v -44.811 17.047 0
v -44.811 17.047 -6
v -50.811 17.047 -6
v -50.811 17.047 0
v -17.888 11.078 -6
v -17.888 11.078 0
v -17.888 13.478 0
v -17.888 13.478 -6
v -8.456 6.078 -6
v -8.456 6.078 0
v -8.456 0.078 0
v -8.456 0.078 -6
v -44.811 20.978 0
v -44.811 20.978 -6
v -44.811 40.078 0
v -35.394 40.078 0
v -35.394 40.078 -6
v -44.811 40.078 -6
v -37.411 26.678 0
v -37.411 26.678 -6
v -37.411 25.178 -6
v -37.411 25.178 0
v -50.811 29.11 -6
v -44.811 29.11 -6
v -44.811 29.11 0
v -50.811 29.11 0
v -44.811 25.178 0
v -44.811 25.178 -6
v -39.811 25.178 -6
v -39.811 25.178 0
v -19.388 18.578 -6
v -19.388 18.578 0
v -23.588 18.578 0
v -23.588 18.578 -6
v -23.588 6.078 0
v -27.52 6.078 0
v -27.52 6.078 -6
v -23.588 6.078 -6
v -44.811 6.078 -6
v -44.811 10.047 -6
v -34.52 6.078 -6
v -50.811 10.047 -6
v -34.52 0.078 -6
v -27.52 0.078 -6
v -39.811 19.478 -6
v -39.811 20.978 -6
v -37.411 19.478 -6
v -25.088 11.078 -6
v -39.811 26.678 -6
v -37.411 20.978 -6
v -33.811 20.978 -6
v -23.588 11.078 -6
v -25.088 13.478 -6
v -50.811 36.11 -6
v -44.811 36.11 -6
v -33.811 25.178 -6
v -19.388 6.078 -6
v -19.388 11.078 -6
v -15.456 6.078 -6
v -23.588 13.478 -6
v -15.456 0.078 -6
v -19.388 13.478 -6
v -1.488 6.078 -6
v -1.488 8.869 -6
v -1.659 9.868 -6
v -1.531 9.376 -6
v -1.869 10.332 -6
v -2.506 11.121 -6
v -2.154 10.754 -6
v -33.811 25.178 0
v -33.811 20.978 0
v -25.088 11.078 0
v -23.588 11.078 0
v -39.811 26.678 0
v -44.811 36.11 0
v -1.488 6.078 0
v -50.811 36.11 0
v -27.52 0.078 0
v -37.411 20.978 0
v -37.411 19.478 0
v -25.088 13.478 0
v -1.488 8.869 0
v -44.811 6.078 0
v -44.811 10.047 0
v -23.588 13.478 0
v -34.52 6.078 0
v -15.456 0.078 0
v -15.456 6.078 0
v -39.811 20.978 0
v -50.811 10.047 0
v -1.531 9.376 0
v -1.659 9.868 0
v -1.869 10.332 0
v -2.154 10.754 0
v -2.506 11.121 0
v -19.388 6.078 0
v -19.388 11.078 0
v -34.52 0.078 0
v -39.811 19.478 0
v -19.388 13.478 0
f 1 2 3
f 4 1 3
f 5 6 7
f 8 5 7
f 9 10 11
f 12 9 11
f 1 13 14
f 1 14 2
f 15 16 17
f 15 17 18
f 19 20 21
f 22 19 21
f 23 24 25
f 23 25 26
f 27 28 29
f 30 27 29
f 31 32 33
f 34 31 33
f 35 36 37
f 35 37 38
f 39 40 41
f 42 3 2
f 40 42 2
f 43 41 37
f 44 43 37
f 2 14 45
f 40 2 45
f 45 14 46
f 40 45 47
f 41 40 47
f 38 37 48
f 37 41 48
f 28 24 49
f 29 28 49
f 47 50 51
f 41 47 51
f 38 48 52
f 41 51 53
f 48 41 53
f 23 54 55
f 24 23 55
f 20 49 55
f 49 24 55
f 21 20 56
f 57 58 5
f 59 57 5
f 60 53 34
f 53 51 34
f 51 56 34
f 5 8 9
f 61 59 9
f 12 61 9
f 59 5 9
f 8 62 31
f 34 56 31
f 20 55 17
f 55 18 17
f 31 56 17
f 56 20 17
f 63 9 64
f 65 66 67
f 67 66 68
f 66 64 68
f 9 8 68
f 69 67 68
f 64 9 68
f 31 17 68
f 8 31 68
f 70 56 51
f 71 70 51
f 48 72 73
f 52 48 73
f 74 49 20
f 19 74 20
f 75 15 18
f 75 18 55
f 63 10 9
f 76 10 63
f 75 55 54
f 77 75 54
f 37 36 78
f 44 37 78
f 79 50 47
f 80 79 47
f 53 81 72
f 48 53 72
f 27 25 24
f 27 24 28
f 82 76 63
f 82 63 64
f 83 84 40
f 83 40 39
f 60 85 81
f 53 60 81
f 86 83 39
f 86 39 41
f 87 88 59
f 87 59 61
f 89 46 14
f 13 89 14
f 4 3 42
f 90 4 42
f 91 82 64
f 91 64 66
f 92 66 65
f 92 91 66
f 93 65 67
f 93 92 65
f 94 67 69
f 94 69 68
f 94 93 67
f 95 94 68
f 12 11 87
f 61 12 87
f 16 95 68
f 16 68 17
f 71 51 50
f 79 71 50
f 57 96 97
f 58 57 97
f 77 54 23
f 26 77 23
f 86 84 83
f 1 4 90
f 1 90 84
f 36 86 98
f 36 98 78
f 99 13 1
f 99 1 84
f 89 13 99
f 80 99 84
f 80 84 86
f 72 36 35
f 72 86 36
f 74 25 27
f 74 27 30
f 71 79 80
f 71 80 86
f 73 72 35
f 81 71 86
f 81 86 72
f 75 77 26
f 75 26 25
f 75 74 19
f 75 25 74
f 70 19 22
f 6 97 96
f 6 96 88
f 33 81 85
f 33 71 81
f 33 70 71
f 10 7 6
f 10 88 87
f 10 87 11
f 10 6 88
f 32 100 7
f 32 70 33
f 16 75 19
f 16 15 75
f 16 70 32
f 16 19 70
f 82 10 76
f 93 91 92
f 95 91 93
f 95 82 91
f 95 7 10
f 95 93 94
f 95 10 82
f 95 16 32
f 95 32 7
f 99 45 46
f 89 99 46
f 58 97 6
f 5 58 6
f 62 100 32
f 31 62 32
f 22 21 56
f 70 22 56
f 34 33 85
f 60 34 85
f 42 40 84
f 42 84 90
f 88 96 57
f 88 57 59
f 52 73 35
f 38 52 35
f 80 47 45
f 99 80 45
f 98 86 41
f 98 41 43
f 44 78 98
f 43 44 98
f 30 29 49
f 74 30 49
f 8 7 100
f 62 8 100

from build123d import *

# Parameters (mm, degrees)
EXTRUDE_1_DEPTH      = 6
SKETCH_2_W           = 7
SKETCH_2_H           = 6
EXTRUDE_2_DEPTH      = 6
CUT_EXTRUDE_1_DEPTH  = 7
SKETCH_21_W          = 7
SKETCH_21_H          = 6
EXTRUDE_21_DEPTH     = 6
SKETCH_22_W          = 7
SKETCH_22_H          = 6
EXTRUDE_22_DEPTH     = 6
CUT_EXTRUDE_12_DEPTH = 7
SKETCH_23_W          = 7
SKETCH_23_H          = 6
EXTRUDE_24_DEPTH     = 6


with BuildPart() as part:
    # Эскиз1 → Бобышка-Вытянуть1 (new body)
    with BuildSketch(Plane.XY):
        with BuildLine():
            Line((-44.810940225, 6.078379342), (-3.810940225, 6.078379342))
            Line((-3.810940225, 6.078379342), (-1.488167872, 6.078379342))
            Line((-1.488167872, 6.078379342), (-1.488167872, 8.8692773))
            ThreePointArc((-1.488167872, 8.8692773), (-1.754354552, 10.10469817), (-2.50567769, 11.120883988))
            Line((-2.50567769, 11.120883988), (-35.394057565, 40.078379342))
            Line((-35.394057565, 40.078379342), (-44.810940225, 40.078379342))
            Line((-44.810940225, 40.078379342), (-44.810940225, 6.078379342))
        make_face()
    extrude(amount=-EXTRUDE_1_DEPTH)

    # Эскиз2 → Бобышка-Вытянуть2 (add)
    with BuildSketch(Plane(origin=(5.189059775, 23.078379342, -6), x_dir=(0, -1, 0), z_dir=(0, 0, -1))):
        with Locations((-9.531849908, 53)):
            Rectangle(SKETCH_2_W, SKETCH_2_H)
        with Locations((9.531849908, 53)):
            Rectangle(SKETCH_2_W, SKETCH_2_H)
    extrude(amount=-EXTRUDE_2_DEPTH)

    # Эскиз3 → Вырез-Вытянуть1 (cut, through all)
    with BuildSketch(Plane(origin=(5.189059775, 23.078379342, -6), x_dir=(0, -1, 0), z_dir=(0, 0, -1))):
        Polygon((-2.1, 45), (-3.6, 45), (-3.6, 42.6), (-2.1, 42.6), (-2.1, 39), (2.1, 39), (2.1, 42.6), (3.6, 42.6), (3.6, 45), (2.1, 45), (2.1, 50), (-2.1, 50), align=None)
    extrude(amount=-CUT_EXTRUDE_1_DEPTH, mode=Mode.SUBTRACT)

    # Эскиз21 → Бобышка-Вытянуть21 (add)
    with BuildSketch(Plane(origin=(5.189059775, 23.078379342, 0), x_dir=(0, 1, 0), z_dir=(0, 0, 1))):
        with Locations((-9.531849908, 53)):
            Rectangle(SKETCH_21_W, SKETCH_21_H)
        with Locations((9.531849908, 53)):
            Rectangle(SKETCH_21_W, SKETCH_21_H)
    extrude(amount=-EXTRUDE_21_DEPTH)

    # Эскиз22 → Бобышка-Вытянуть22 (add)
    with BuildSketch(Plane(origin=(-21.488167872, 56.078379342, 0), x_dir=(-1, 0, 0), z_dir=(0, 0, 1))):
        with Locations((-9.531849908, 53)):
            Rectangle(SKETCH_22_W, SKETCH_22_H)
        with Locations((9.531849908, 53)):
            Rectangle(SKETCH_22_W, SKETCH_22_H)
    extrude(amount=-EXTRUDE_22_DEPTH)

    # Эскиз32 → Вырез-Вытянуть12 (cut, through all)
    with BuildSketch(Plane(origin=(-21.488167872, 56.078379342, 0), x_dir=(-1, 0, 0), z_dir=(0, 0, 1))):
        Polygon((-2.1, 45), (-3.6, 45), (-3.6, 42.6), (-2.1, 42.6), (-2.1, 37.5), (2.1, 37.5), (2.1, 42.6), (3.6, 42.6), (3.6, 45), (2.1, 45), (2.1, 50), (-2.1, 50), align=None)
    extrude(amount=-CUT_EXTRUDE_12_DEPTH, mode=Mode.SUBTRACT)

    # Эскиз23 → Бобышка-Вытянуть24 (add)
    with BuildSketch(Plane(origin=(-21.488167872, 56.078379342, -6), x_dir=(1, 0, 0), z_dir=(0, 0, -1))):
        with Locations((-9.531849908, 53)):
            Rectangle(SKETCH_23_W, SKETCH_23_H)
        with Locations((9.531849908, 53)):
            Rectangle(SKETCH_23_W, SKETCH_23_H)
    extrude(amount=-EXTRUDE_24_DEPTH)


solid = part.part
